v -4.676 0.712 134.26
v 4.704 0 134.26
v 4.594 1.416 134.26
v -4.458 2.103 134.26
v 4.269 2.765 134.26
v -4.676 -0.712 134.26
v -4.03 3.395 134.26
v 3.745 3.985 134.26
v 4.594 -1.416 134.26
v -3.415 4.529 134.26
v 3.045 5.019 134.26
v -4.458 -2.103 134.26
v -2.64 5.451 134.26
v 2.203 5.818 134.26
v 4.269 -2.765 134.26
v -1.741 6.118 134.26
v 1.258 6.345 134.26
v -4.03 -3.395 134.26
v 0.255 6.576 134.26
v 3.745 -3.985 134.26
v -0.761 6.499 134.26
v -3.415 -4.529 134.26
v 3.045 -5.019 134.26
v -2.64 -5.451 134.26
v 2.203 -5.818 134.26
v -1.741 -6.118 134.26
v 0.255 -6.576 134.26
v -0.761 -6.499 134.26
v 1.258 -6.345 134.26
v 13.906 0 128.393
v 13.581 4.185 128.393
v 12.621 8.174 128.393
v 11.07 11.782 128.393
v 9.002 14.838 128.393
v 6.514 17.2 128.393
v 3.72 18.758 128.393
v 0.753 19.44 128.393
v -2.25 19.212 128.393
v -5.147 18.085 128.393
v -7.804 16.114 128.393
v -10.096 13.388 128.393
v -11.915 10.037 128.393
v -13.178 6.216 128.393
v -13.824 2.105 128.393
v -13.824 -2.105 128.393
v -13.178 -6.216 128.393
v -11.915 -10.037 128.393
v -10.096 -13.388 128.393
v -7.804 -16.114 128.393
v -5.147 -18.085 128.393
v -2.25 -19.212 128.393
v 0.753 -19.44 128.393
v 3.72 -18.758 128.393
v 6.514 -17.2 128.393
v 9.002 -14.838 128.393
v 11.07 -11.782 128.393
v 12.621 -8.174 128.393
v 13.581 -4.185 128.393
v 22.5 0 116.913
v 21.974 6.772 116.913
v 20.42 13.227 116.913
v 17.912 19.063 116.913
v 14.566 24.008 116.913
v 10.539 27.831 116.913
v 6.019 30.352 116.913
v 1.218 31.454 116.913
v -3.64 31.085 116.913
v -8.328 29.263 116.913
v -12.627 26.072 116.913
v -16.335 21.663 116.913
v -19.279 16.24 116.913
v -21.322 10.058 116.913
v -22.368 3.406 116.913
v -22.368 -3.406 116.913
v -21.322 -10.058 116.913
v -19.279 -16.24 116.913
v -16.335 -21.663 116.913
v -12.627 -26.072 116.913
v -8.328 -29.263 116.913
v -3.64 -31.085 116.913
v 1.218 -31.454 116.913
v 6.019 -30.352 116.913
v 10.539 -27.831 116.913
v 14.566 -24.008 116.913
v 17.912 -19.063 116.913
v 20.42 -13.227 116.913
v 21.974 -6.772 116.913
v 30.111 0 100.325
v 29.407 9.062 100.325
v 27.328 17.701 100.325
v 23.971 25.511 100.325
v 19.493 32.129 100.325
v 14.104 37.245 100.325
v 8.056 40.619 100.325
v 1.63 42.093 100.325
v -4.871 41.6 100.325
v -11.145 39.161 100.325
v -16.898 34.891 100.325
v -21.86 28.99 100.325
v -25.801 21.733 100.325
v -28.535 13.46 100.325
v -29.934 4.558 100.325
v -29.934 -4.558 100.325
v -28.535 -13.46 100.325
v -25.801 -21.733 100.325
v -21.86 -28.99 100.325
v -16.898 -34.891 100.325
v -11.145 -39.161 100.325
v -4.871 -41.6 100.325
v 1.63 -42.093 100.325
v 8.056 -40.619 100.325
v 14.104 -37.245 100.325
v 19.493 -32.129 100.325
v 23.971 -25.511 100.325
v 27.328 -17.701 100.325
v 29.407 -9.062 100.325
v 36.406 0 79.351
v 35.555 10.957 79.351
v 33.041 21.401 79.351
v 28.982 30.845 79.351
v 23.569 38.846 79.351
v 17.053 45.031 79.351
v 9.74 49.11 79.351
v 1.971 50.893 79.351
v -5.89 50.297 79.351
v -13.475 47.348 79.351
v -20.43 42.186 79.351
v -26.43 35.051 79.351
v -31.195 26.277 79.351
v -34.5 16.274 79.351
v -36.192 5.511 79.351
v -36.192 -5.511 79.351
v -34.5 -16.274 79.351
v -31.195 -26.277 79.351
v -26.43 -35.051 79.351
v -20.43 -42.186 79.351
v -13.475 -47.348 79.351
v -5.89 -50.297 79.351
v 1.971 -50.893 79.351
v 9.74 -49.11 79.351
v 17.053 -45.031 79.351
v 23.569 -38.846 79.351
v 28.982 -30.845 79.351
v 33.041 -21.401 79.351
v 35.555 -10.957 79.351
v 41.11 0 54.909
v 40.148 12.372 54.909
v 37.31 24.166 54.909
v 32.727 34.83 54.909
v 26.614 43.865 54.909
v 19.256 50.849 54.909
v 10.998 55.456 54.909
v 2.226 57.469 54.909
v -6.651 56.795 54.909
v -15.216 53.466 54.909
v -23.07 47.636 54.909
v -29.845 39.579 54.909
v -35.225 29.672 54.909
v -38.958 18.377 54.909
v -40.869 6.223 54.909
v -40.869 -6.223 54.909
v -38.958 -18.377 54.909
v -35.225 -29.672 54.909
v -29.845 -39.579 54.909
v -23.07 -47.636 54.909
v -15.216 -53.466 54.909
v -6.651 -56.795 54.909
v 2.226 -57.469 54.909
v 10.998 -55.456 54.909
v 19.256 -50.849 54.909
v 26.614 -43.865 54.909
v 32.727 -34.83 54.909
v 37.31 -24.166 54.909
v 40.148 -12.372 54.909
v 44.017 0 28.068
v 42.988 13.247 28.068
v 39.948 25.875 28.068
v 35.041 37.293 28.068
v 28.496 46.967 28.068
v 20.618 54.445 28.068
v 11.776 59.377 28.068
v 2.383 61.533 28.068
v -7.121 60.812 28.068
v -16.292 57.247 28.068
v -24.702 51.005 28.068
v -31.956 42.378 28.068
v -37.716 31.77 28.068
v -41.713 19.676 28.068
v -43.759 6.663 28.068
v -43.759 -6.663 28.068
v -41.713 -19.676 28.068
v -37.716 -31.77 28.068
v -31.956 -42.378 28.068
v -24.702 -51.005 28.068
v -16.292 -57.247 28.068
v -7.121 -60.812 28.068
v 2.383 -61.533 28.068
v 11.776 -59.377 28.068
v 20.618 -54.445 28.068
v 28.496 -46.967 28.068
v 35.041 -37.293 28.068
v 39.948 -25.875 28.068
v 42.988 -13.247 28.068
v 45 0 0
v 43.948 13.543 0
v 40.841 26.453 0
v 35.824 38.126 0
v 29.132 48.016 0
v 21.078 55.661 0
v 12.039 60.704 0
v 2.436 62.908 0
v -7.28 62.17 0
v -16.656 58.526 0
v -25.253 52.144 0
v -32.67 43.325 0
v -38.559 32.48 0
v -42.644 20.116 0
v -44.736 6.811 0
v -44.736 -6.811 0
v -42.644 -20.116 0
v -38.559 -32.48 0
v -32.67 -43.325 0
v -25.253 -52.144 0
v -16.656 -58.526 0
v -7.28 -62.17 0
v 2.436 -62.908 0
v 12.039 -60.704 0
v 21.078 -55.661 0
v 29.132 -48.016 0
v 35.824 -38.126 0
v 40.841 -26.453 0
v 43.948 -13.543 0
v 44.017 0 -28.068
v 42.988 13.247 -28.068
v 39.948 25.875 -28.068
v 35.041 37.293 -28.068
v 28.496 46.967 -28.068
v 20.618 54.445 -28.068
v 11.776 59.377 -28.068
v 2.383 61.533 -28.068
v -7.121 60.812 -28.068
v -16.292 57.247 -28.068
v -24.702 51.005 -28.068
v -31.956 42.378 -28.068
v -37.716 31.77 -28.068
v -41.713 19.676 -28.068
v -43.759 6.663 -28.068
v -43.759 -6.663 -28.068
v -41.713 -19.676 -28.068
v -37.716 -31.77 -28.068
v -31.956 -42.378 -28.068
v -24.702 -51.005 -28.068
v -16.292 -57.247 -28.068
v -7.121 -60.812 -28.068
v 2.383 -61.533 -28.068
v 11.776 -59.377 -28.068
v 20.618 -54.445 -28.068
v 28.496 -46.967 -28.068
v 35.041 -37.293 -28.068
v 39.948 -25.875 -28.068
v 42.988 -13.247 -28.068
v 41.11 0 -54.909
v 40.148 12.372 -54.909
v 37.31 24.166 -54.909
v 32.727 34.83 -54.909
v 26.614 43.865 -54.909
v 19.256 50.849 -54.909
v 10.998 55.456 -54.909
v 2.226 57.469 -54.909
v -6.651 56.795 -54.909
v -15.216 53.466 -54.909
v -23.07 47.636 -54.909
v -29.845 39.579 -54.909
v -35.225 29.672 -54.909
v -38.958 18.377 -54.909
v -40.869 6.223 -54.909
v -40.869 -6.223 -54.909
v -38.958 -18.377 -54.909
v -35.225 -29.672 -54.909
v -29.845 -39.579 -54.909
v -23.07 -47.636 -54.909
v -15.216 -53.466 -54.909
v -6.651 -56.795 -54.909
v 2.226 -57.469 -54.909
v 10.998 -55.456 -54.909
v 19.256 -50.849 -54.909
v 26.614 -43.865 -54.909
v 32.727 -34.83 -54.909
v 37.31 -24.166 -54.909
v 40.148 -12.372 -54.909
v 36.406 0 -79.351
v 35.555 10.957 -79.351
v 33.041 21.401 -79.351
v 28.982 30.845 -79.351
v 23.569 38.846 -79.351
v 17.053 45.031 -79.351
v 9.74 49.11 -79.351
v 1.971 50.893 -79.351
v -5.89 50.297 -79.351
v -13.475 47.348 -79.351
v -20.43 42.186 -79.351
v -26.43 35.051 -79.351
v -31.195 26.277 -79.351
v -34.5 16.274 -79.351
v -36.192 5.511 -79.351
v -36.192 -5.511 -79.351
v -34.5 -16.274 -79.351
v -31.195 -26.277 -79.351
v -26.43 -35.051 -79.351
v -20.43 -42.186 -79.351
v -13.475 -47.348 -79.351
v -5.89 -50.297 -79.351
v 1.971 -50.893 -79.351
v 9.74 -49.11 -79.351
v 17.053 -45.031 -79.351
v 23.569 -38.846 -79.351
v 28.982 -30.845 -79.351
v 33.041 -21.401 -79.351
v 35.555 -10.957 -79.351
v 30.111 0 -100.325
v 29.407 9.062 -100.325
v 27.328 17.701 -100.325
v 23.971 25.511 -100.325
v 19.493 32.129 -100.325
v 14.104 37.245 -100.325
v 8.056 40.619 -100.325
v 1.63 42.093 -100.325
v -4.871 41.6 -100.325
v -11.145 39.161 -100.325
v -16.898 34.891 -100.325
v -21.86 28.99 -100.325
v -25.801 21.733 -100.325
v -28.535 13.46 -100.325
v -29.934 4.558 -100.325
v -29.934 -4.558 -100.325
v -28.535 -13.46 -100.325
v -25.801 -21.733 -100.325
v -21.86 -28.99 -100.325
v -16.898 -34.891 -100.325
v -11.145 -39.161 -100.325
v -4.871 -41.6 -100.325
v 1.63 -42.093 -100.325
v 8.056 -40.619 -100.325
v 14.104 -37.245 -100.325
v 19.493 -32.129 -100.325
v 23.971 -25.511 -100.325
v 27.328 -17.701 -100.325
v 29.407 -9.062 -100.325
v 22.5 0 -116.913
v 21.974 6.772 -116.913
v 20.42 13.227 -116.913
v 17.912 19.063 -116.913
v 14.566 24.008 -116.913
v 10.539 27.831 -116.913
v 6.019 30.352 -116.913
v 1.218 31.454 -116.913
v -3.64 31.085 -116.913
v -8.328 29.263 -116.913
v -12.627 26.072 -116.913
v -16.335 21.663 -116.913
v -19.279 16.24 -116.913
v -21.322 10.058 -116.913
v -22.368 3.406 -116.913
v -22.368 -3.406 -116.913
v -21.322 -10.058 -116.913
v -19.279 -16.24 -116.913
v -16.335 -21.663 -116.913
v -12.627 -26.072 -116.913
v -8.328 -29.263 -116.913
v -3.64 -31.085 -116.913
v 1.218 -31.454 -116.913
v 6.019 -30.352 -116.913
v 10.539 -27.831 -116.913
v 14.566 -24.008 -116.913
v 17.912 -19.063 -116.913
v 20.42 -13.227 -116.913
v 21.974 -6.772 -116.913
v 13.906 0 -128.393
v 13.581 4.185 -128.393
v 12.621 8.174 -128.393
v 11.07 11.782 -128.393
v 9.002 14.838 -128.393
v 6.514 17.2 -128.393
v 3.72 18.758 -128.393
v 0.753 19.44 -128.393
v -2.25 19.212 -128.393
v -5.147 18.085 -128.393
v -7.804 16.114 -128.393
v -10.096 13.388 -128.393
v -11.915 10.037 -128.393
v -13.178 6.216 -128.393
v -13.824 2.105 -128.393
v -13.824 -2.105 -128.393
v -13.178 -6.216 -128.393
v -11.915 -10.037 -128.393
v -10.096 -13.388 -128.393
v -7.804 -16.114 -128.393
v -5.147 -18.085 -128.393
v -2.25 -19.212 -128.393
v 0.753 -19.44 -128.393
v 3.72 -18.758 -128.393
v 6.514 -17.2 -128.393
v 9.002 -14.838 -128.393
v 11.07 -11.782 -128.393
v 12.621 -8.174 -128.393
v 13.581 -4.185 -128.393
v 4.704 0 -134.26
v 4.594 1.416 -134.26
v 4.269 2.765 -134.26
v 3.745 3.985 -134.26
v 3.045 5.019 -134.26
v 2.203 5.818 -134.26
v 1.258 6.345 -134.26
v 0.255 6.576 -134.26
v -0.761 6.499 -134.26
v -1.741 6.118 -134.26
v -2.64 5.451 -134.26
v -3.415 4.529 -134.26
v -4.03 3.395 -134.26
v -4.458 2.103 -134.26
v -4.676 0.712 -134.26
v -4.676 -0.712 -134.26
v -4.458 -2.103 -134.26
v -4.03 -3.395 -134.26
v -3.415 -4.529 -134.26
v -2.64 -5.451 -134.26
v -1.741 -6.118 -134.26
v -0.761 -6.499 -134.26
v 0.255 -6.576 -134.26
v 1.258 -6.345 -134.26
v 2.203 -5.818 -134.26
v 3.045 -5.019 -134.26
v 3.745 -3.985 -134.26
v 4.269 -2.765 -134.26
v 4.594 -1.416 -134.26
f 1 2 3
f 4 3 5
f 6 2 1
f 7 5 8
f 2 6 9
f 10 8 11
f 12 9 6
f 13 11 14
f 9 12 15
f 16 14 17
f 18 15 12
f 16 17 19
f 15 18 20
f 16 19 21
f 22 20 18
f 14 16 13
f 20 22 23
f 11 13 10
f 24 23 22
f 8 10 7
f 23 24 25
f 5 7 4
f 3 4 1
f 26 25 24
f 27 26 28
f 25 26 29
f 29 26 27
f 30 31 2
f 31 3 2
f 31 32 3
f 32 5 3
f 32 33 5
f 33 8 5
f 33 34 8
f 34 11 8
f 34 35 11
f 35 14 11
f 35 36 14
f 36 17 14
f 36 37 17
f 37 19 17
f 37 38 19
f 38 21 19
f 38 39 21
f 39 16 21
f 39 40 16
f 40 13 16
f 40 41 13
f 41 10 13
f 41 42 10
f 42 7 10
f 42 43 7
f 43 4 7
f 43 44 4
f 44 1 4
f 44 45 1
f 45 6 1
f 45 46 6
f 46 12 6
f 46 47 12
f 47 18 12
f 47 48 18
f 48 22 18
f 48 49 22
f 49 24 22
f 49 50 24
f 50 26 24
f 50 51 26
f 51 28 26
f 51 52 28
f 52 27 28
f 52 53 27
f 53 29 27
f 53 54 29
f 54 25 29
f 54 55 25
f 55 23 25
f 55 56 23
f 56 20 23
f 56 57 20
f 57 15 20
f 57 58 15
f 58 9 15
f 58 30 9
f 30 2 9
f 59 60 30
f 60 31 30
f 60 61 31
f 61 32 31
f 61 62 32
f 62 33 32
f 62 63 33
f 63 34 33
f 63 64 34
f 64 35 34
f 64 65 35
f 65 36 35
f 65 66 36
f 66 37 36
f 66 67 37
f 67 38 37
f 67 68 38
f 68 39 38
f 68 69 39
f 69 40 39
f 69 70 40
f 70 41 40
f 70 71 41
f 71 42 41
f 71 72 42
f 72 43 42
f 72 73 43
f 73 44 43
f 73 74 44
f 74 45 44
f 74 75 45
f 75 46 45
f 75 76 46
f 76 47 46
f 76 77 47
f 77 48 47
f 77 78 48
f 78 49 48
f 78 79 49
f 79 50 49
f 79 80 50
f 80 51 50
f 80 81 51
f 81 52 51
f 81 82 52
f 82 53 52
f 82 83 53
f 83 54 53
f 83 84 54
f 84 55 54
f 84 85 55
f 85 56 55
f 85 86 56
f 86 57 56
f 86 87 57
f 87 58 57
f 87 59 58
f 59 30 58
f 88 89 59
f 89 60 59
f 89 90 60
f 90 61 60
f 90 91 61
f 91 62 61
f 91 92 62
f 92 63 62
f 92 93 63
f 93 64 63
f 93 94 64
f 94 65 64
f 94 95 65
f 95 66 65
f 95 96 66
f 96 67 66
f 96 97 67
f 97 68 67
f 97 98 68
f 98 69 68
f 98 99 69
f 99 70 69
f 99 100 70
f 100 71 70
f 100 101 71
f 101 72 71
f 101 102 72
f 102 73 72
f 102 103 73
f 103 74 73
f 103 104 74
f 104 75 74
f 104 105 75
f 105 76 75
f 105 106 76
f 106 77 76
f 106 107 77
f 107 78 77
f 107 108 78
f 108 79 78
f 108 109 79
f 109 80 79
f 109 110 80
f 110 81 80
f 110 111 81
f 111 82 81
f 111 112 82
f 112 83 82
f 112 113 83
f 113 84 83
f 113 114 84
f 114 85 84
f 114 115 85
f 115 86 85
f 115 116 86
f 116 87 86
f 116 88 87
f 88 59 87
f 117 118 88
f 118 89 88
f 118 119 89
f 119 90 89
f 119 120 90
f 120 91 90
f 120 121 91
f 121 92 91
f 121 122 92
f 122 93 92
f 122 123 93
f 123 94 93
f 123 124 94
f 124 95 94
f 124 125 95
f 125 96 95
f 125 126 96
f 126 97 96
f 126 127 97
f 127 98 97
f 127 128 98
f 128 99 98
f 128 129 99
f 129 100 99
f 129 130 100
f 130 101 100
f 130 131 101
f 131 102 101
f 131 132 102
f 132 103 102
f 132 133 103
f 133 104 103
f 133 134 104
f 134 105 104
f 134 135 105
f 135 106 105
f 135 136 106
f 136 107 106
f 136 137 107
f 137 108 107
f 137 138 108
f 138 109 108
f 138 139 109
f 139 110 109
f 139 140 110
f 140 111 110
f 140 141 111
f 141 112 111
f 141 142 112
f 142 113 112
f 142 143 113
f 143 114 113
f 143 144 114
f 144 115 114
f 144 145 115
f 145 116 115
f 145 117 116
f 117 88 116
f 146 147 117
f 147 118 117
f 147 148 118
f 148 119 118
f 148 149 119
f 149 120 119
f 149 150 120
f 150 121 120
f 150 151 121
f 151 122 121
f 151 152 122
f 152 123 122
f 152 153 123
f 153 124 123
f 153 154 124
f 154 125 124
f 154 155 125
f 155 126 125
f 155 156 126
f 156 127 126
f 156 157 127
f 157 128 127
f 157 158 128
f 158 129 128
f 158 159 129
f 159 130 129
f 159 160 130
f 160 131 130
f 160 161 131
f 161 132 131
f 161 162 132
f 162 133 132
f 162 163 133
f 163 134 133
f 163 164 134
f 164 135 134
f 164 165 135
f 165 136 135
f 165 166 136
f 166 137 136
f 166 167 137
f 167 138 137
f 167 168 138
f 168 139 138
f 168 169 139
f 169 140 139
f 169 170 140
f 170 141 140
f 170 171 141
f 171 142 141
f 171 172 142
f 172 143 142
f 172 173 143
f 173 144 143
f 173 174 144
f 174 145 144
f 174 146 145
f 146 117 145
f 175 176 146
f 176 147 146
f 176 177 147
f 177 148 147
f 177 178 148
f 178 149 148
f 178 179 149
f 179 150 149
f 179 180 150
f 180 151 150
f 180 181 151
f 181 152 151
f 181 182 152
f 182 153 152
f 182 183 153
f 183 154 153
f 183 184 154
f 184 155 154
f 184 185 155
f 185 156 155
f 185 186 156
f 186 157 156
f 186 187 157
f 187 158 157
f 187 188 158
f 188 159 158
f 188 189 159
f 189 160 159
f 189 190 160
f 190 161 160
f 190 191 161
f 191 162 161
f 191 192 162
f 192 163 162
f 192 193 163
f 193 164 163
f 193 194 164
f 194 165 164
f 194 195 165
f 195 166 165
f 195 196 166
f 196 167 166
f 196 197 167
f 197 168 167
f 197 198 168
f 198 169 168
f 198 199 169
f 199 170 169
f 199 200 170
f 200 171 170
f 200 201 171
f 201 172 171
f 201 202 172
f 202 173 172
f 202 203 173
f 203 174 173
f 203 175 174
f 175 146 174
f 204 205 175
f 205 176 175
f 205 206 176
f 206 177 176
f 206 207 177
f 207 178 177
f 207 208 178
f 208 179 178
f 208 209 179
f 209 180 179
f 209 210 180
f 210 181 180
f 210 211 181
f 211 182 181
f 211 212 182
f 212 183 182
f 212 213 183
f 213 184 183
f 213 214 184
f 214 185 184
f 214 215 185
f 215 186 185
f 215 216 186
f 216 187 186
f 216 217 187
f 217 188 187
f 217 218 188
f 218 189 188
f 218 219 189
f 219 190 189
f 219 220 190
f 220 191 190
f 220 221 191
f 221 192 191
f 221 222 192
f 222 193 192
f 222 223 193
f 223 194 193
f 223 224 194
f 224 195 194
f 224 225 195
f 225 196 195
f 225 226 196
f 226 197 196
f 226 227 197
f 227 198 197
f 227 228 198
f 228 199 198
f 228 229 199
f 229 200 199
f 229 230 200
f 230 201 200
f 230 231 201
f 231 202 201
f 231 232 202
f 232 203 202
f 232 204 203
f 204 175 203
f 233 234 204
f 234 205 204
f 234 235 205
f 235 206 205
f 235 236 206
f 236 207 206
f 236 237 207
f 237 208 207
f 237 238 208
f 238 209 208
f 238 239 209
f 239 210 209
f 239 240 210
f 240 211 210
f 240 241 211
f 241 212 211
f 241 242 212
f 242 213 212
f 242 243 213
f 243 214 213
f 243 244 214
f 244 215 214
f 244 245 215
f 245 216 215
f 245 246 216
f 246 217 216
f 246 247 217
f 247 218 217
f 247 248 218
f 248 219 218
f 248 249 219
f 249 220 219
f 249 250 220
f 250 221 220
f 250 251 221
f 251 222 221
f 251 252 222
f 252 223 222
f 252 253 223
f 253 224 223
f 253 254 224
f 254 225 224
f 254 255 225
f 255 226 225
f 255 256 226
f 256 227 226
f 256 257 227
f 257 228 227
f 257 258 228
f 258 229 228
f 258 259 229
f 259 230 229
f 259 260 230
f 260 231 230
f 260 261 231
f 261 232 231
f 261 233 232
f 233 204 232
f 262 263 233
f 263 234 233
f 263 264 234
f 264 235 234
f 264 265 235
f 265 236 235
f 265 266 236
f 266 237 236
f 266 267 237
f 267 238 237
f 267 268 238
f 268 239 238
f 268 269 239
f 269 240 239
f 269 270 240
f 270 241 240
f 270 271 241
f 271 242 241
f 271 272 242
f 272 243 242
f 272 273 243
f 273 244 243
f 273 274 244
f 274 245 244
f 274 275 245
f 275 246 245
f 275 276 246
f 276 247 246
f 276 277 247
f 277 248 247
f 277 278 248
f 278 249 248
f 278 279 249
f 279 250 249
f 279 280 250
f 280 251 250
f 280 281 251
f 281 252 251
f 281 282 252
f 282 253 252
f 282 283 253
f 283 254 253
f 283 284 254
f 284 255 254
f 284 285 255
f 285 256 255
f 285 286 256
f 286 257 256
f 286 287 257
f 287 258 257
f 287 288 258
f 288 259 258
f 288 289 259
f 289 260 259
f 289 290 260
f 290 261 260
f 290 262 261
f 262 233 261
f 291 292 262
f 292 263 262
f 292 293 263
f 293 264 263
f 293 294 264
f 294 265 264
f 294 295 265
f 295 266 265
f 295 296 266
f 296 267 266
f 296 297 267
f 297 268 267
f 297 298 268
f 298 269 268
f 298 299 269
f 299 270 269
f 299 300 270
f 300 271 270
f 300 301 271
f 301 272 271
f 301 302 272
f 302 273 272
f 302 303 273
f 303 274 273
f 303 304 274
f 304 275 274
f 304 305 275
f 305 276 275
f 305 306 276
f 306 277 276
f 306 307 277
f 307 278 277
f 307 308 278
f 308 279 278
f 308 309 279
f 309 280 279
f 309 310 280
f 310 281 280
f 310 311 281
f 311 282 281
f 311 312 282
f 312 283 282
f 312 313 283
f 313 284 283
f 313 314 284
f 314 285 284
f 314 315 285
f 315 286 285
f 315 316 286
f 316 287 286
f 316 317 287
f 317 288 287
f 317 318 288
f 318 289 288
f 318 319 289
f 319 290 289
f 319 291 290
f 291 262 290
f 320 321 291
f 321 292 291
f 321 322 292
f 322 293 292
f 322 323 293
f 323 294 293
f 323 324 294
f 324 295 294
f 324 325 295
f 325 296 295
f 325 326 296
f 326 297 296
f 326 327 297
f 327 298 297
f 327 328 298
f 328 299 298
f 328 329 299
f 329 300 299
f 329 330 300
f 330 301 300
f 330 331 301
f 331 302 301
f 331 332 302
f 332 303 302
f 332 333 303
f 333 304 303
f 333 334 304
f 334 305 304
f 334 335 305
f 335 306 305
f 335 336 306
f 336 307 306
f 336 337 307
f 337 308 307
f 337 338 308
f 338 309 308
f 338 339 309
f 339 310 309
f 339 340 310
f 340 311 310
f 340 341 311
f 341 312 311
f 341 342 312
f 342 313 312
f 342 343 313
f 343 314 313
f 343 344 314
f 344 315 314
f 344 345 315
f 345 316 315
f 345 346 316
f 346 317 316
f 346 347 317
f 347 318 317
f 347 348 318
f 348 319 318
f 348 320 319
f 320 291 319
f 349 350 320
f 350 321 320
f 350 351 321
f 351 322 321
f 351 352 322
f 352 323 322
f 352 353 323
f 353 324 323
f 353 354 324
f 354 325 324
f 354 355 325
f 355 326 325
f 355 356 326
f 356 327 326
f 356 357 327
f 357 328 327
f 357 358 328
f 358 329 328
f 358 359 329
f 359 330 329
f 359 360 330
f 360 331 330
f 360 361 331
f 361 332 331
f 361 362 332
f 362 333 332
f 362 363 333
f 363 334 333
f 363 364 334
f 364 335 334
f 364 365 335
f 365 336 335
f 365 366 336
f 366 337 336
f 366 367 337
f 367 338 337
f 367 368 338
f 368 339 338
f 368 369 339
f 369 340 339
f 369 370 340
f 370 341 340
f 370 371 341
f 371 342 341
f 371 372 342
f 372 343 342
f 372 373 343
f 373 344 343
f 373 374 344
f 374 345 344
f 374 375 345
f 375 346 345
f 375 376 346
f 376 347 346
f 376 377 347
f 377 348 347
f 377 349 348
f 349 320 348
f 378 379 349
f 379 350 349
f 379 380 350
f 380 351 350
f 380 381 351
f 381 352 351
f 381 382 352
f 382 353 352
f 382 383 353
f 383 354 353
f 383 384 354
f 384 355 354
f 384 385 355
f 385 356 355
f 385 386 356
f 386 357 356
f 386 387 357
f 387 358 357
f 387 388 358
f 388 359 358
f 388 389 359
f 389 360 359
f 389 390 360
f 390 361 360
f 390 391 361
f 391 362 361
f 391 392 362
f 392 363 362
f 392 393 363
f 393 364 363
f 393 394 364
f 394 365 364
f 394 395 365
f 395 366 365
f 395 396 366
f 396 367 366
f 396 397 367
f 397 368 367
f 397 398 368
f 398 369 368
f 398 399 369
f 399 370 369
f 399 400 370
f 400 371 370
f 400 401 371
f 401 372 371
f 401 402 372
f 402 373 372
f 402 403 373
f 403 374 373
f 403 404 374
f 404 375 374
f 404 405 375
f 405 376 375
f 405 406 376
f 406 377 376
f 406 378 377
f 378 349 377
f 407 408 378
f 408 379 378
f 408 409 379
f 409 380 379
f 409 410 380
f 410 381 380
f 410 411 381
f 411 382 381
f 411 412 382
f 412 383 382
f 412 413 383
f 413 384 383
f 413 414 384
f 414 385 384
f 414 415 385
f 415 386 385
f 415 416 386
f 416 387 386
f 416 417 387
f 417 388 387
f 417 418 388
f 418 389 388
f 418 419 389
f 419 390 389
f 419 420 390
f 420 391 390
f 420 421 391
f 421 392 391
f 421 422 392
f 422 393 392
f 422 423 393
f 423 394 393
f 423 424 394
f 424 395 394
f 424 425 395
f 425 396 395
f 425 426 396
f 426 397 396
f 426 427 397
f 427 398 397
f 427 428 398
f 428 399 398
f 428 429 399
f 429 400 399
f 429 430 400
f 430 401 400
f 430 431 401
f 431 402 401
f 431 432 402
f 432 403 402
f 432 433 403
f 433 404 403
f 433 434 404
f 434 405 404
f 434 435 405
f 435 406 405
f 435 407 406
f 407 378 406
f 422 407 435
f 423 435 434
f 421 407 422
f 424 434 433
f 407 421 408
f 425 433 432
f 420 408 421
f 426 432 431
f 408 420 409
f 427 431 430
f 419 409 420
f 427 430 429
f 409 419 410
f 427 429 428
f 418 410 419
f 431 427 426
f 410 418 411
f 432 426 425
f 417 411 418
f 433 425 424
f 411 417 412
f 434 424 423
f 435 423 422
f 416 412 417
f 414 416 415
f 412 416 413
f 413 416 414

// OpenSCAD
// Generated by SolidPython 1.0.1 on 2020-07-29 00:46:46


scale(v = [5, 7, 15]) {
	sphere(r = 9);
}
/***********************************************
*********      SolidPython code:      **********
************************************************
 
# import packages: SolidPython
from solid import *
from solid.utils import *
from itertools import chain, combinations, permutations


class Resize:

    def __init__(self, scad_file):
        self.scad_file = scad_file
        #self.scad_file = import_scad(scad_file)
        # cone/cylinder param:
        self.r1 = 0
        self.r2 = 0
        self.h = 0
        # rectangular prism param:
        self.w = 0
        self.l = 0
        # ellipse param:
        self.r = 0

    # import OpenScad code (file name corresponds to shape)


    # classify shape + parameters
    def assign(self, param1, param2, param3):
        if self.scad_file == 'cone.scad':
            self.r1 = param1
            self.r2 = param2
            self.h = param3
        elif self.scad_file == 'cylinder.scad':
            self.r1 = param1
            self.r2 = param2
            self.h = param3
        elif self.scad_file == 'rectangularPrism.scad':
            self.h = param1
            self.l = param2
            self.w = param3
        else:
            self.r = param1
            self.h = param2

    # resize parameters
    def iterate(self):
        x = range(3, 20, 2)
        i = 1
        if self.scad_file == 'cone.scad':
            tempList = list(permutations(x, 2))
            for temp in tempList:
                param1 = temp[0]
                param2 = temp[1]
                filepath = 'produced_scad_files/' + 'cone' + str(param1) + '_' + str(param2) + '_' + '.scad'
                scad_render_to_file(cylinder(h=param1, r1=param2, r2=0), filepath)

        elif self.scad_file == 'cylinder.scad':
            tempList = list(permutations(x, 3))
            for temp in tempList:
                param1 = temp[0]
                param2 = temp[1]
                filepath = 'produced_scad_files/' + 'cylinder' + str(param1) + '_' + str(param2) + '_' + '.scad'
                scad_render_to_file(cylinder(h=param1, r1=param2, r2=param2), filepath)

        elif self.scad_file == 'rectangularPrism.scad':
            tempList = list(permutations(x, 3))
            for temp in tempList:
                param1 = temp[0]
                param2 = temp[1]
                param3 = temp[2]
                filepath = 'produced_scad_files/' + 'rectangularPrism' + str(param1) + '_' + str(param2) + '_' + str(
                    param3) + '.scad'
                scad_render_to_file(cube(size=(param1, param2, param3)), filepath)

        elif self.scad_file == 'ellipse.scad':
            tempList = list(permutations(x, 4))
            for temp in tempList:
                param1 = temp[0]
                param2 = temp[1]
                param3 = temp[2]
                param4 = temp[3]
                filepath = 'produced_scad_files/' + 'ellipse' + str(param1) + '_' + str(param2) + '_' + str(param3) + '_' + str(param4) + '.scad'
                scad_render_to_file(scale([param1, param2, param3])(sphere(r=param4)), filepath)

    def render_to_scadfile(self):
        scad_render_to_file(scad, 'example.scad') 
 
************************************************/
